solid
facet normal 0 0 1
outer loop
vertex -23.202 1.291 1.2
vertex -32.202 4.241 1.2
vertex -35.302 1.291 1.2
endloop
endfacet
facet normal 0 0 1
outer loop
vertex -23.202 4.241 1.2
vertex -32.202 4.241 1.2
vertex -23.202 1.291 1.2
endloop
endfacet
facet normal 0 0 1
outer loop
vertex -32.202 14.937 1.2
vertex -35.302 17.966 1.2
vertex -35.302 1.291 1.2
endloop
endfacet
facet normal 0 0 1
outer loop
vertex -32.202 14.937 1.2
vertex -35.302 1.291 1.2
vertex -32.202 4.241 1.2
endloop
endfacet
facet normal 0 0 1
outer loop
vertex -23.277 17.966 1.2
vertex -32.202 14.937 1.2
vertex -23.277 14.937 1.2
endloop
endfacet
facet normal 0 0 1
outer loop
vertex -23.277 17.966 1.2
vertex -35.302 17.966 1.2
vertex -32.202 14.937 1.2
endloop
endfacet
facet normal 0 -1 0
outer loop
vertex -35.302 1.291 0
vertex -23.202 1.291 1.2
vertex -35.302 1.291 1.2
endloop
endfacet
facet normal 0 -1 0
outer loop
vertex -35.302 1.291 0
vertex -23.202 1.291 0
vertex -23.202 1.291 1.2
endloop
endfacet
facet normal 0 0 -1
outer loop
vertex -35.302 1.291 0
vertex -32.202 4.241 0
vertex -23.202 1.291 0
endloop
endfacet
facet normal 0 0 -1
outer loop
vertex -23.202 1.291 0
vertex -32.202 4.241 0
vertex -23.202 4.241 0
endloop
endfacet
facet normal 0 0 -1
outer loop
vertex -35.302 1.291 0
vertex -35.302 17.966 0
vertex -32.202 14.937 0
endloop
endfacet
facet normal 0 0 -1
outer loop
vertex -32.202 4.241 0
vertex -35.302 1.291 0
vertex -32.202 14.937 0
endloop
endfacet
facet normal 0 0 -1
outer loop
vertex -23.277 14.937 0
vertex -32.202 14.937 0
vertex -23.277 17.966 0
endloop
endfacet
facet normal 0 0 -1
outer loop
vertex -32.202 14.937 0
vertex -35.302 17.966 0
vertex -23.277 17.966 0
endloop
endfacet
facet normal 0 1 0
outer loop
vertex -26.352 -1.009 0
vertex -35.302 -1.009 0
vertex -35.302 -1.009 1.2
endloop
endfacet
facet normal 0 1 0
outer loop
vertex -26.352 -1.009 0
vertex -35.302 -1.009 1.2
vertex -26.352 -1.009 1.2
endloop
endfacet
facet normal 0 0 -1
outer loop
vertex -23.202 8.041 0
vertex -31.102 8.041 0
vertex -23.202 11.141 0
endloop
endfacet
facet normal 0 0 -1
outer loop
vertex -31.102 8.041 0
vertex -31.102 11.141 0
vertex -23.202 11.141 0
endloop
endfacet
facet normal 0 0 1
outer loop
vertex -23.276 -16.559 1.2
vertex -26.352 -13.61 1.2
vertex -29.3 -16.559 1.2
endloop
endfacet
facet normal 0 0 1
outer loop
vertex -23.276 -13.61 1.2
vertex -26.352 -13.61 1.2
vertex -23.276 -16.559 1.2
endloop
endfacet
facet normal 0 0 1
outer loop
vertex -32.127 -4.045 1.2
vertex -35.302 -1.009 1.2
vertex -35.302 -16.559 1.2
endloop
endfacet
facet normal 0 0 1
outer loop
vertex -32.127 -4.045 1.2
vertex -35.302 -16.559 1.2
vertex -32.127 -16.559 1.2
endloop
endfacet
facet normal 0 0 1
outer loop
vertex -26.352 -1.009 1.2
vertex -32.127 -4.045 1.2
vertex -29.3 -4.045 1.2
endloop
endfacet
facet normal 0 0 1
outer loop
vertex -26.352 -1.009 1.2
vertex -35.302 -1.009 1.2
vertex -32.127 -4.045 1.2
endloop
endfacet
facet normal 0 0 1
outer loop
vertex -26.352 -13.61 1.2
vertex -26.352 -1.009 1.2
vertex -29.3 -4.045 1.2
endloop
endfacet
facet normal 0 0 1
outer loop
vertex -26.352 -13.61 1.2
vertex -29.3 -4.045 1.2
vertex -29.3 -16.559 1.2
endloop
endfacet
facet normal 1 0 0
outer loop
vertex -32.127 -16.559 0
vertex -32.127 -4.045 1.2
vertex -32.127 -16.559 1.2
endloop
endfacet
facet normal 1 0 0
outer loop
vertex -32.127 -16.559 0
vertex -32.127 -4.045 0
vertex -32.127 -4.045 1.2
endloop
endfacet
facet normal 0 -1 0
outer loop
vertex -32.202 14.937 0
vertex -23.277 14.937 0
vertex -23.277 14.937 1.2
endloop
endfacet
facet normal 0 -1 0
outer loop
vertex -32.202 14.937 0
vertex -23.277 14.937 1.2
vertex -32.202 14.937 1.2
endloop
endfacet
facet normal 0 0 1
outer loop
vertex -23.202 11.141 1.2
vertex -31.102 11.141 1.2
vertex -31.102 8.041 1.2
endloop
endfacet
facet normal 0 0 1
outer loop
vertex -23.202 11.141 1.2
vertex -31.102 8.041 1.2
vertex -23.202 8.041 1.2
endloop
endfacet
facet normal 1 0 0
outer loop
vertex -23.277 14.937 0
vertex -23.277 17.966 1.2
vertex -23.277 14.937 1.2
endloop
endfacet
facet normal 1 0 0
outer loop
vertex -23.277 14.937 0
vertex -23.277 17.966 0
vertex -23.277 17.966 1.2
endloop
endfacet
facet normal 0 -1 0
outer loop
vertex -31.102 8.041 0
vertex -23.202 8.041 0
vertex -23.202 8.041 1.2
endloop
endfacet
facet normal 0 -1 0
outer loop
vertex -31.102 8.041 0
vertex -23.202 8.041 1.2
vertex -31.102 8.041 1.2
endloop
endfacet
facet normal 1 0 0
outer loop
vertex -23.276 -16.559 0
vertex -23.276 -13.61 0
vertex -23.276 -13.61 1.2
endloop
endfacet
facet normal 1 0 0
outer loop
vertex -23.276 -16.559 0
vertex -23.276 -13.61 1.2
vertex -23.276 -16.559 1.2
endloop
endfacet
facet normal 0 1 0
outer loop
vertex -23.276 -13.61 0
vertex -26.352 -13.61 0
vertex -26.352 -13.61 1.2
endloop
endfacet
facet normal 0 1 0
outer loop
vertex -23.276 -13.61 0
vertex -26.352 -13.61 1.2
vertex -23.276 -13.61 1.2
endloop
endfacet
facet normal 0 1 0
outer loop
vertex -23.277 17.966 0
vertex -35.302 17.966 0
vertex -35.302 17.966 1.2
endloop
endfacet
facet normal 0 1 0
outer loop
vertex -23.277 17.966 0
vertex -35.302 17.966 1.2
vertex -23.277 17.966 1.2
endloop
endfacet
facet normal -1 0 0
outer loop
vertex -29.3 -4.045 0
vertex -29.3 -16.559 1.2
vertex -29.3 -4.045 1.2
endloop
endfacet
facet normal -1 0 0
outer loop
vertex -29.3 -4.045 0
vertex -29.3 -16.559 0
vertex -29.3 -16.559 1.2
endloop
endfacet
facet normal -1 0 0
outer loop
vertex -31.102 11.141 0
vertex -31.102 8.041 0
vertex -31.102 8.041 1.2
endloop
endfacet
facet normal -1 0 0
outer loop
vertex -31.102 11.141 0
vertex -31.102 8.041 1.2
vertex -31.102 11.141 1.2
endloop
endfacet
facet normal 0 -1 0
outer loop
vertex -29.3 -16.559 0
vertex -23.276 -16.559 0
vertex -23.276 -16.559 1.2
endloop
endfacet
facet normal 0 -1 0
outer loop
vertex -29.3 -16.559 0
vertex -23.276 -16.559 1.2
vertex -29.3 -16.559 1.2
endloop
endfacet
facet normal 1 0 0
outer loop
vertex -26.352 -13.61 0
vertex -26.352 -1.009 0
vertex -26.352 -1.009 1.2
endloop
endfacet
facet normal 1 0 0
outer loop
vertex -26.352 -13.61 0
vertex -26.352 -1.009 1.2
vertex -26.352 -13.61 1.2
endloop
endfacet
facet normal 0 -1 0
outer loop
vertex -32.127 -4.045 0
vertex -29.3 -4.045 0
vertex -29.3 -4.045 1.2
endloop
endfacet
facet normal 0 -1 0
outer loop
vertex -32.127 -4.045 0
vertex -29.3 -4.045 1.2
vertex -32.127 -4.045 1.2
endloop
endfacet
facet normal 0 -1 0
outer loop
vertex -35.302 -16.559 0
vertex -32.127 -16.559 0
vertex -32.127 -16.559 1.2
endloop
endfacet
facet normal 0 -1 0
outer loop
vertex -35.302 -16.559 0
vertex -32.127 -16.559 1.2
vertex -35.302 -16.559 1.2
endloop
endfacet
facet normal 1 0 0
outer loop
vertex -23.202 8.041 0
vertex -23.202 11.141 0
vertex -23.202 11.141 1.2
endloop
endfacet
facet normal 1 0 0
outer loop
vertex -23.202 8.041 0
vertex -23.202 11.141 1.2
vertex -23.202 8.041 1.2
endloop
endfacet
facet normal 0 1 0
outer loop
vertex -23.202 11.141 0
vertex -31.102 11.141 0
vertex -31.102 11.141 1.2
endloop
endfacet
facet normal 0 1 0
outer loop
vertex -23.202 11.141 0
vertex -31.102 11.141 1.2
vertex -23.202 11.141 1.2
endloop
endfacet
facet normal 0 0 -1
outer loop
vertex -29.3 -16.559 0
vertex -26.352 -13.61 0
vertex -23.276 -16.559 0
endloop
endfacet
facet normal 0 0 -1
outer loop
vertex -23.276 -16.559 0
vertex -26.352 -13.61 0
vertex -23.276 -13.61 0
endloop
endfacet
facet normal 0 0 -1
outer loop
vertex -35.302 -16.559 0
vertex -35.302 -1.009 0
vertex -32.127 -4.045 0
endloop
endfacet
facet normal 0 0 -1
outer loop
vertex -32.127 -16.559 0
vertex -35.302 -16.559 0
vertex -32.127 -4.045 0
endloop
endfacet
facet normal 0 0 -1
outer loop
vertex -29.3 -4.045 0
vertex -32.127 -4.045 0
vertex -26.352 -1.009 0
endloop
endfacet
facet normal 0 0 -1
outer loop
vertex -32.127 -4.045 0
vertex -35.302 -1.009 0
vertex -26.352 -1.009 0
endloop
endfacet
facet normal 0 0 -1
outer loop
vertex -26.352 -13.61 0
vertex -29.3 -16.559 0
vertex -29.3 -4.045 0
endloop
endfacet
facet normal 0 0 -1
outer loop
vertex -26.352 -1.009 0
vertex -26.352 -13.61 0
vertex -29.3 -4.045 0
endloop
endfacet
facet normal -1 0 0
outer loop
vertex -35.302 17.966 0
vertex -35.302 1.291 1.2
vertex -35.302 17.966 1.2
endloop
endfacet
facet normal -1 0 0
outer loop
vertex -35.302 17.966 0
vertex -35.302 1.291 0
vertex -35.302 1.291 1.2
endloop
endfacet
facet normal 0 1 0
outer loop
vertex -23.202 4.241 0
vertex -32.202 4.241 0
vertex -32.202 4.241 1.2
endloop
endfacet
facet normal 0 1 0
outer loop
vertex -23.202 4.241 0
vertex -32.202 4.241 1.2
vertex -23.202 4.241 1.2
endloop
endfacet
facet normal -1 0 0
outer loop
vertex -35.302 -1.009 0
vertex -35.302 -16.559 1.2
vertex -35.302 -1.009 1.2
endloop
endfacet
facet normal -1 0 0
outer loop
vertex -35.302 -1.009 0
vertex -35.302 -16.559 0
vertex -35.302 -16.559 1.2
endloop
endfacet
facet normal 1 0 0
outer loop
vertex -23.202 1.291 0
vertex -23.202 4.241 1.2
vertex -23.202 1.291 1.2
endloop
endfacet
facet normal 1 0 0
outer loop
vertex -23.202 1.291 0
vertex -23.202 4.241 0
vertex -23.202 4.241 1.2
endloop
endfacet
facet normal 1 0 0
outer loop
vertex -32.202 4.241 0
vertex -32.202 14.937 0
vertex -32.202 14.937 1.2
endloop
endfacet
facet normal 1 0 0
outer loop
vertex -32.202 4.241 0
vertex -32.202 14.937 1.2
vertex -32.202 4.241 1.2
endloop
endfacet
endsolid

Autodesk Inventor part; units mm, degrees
ref_plane "YZ Plane" through (0, 0, 0) normal (1, 0, 0) x (0, 1, 0)
ref_plane "XZ Plane" through (0, 0, 0) normal (0, 1, 0) x (-1, 0, 0)
ref_plane "XY Plane" through (0, 0, 0) normal (0, 0, 1) x (1, 0, 0)
sketch "Sketch1" plane through (0, 0, 0) normal (0, 0, 1) x (1, 0, 0)
  line L0 (-26.5523, -13.8097) -> (-23.4761, -13.8097) construction
  line L1 (-26.5523, -1.2089) -> (-26.5523, -13.8097) construction
  line L2 (-35.1023, -1.2089) -> (-26.5523, -1.2089) construction
  line L3 (-35.1023, -16.3589) -> (-35.1023, -1.2089) construction
  line L4 (-32.3273, -16.3589) -> (-35.1023, -16.3589) construction
  line L5 (-32.3273, -3.8452) -> (-32.3273, -16.3589) construction
  line L6 (-29.0999, -3.8452) -> (-32.3273, -3.8452) construction
  line L7 (-29.0999, -16.3589) -> (-29.0999, -3.8452) construction
  line L8 (-23.4761, -16.3589) -> (-29.0999, -16.3589) construction
  line L9 (-23.4761, -13.8097) -> (-23.4761, -16.3589) construction
  line L10 (-32.4023, 4.0411) -> (-23.4023, 4.0411) construction
  line L11 (-32.4023, 15.1366) -> (-32.4023, 4.0411) construction
  line L12 (-23.4769, 15.1366) -> (-32.4023, 15.1366) construction
  line L13 (-23.4769, 17.7661) -> (-23.4769, 15.1366) construction
  line L14 (-35.1023, 17.7661) -> (-23.4769, 17.7661) construction
  line L15 (-35.1023, 1.4911) -> (-35.1023, 17.7661) construction
  line L16 (-23.4023, 1.4911) -> (-35.1023, 1.4911) construction
  line L17 (-23.4023, 4.0411) -> (-23.4023, 1.4911) construction
  line L18 (-30.9023, 8.2411) -> (-30.9023, 10.9411) construction
  line L19 (-23.4023, 8.2411) -> (-30.9023, 8.2411) construction
  line L20 (-23.4023, 10.9411) -> (-23.4023, 8.2411) construction
  line L21 (-30.9023, 10.9411) -> (-23.4023, 10.9411) construction
  line L22 (-23.2769, 17.9661) -> (-23.2769, 14.9366)
  line L23 (-23.2769, 14.9366) -> (-32.2023, 14.9366)
  line L24 (-32.2023, 14.9366) -> (-32.2023, 4.2411)
  line L25 (-32.2023, 4.2411) -> (-23.2023, 4.2411)
  line L26 (-23.2023, 4.2411) -> (-23.2023, 1.2911)
  line L27 (-23.2023, 1.2911) -> (-35.3023, 1.2911)
  line L28 (-35.3023, 1.2911) -> (-35.3023, 17.9661)
  line L29 (-35.3023, 17.9661) -> (-23.2769, 17.9661)
  line L30 (-23.2023, 11.1411) -> (-23.2023, 8.0411)
  line L31 (-23.2023, 8.0411) -> (-31.1023, 8.0411)
  line L32 (-31.1023, 8.0411) -> (-31.1023, 11.1411)
  line L33 (-31.1023, 11.1411) -> (-23.2023, 11.1411)
  line L34 (-29.2999, -4.0452) -> (-32.1273, -4.0452)
  line L35 (-32.1273, -4.0452) -> (-32.1273, -16.5589)
  line L36 (-32.1273, -16.5589) -> (-35.3023, -16.5589)
  line L37 (-35.3023, -16.5589) -> (-35.3023, -1.0089)
  line L38 (-35.3023, -1.0089) -> (-26.3523, -1.0089)
  line L39 (-26.3523, -1.0089) -> (-26.3523, -13.6097)
  line L40 (-26.3523, -13.6097) -> (-23.2761, -13.6097)
  line L41 (-23.2761, -13.6097) -> (-23.2761, -16.5589)
  line L42 (-23.2761, -16.5589) -> (-29.2999, -16.5589)
  line L43 (-29.2999, -16.5589) -> (-29.2999, -4.0452)
  point P0 (0, 0)
  dimension "d2" = 0.2
  dimension "d3" = 0.2
  dimension "d4" = 0.2
extrude "Extrusion1" add sketch "Sketch1" along normal blind 1.2
properties part number "ROBOILO LOGO"
